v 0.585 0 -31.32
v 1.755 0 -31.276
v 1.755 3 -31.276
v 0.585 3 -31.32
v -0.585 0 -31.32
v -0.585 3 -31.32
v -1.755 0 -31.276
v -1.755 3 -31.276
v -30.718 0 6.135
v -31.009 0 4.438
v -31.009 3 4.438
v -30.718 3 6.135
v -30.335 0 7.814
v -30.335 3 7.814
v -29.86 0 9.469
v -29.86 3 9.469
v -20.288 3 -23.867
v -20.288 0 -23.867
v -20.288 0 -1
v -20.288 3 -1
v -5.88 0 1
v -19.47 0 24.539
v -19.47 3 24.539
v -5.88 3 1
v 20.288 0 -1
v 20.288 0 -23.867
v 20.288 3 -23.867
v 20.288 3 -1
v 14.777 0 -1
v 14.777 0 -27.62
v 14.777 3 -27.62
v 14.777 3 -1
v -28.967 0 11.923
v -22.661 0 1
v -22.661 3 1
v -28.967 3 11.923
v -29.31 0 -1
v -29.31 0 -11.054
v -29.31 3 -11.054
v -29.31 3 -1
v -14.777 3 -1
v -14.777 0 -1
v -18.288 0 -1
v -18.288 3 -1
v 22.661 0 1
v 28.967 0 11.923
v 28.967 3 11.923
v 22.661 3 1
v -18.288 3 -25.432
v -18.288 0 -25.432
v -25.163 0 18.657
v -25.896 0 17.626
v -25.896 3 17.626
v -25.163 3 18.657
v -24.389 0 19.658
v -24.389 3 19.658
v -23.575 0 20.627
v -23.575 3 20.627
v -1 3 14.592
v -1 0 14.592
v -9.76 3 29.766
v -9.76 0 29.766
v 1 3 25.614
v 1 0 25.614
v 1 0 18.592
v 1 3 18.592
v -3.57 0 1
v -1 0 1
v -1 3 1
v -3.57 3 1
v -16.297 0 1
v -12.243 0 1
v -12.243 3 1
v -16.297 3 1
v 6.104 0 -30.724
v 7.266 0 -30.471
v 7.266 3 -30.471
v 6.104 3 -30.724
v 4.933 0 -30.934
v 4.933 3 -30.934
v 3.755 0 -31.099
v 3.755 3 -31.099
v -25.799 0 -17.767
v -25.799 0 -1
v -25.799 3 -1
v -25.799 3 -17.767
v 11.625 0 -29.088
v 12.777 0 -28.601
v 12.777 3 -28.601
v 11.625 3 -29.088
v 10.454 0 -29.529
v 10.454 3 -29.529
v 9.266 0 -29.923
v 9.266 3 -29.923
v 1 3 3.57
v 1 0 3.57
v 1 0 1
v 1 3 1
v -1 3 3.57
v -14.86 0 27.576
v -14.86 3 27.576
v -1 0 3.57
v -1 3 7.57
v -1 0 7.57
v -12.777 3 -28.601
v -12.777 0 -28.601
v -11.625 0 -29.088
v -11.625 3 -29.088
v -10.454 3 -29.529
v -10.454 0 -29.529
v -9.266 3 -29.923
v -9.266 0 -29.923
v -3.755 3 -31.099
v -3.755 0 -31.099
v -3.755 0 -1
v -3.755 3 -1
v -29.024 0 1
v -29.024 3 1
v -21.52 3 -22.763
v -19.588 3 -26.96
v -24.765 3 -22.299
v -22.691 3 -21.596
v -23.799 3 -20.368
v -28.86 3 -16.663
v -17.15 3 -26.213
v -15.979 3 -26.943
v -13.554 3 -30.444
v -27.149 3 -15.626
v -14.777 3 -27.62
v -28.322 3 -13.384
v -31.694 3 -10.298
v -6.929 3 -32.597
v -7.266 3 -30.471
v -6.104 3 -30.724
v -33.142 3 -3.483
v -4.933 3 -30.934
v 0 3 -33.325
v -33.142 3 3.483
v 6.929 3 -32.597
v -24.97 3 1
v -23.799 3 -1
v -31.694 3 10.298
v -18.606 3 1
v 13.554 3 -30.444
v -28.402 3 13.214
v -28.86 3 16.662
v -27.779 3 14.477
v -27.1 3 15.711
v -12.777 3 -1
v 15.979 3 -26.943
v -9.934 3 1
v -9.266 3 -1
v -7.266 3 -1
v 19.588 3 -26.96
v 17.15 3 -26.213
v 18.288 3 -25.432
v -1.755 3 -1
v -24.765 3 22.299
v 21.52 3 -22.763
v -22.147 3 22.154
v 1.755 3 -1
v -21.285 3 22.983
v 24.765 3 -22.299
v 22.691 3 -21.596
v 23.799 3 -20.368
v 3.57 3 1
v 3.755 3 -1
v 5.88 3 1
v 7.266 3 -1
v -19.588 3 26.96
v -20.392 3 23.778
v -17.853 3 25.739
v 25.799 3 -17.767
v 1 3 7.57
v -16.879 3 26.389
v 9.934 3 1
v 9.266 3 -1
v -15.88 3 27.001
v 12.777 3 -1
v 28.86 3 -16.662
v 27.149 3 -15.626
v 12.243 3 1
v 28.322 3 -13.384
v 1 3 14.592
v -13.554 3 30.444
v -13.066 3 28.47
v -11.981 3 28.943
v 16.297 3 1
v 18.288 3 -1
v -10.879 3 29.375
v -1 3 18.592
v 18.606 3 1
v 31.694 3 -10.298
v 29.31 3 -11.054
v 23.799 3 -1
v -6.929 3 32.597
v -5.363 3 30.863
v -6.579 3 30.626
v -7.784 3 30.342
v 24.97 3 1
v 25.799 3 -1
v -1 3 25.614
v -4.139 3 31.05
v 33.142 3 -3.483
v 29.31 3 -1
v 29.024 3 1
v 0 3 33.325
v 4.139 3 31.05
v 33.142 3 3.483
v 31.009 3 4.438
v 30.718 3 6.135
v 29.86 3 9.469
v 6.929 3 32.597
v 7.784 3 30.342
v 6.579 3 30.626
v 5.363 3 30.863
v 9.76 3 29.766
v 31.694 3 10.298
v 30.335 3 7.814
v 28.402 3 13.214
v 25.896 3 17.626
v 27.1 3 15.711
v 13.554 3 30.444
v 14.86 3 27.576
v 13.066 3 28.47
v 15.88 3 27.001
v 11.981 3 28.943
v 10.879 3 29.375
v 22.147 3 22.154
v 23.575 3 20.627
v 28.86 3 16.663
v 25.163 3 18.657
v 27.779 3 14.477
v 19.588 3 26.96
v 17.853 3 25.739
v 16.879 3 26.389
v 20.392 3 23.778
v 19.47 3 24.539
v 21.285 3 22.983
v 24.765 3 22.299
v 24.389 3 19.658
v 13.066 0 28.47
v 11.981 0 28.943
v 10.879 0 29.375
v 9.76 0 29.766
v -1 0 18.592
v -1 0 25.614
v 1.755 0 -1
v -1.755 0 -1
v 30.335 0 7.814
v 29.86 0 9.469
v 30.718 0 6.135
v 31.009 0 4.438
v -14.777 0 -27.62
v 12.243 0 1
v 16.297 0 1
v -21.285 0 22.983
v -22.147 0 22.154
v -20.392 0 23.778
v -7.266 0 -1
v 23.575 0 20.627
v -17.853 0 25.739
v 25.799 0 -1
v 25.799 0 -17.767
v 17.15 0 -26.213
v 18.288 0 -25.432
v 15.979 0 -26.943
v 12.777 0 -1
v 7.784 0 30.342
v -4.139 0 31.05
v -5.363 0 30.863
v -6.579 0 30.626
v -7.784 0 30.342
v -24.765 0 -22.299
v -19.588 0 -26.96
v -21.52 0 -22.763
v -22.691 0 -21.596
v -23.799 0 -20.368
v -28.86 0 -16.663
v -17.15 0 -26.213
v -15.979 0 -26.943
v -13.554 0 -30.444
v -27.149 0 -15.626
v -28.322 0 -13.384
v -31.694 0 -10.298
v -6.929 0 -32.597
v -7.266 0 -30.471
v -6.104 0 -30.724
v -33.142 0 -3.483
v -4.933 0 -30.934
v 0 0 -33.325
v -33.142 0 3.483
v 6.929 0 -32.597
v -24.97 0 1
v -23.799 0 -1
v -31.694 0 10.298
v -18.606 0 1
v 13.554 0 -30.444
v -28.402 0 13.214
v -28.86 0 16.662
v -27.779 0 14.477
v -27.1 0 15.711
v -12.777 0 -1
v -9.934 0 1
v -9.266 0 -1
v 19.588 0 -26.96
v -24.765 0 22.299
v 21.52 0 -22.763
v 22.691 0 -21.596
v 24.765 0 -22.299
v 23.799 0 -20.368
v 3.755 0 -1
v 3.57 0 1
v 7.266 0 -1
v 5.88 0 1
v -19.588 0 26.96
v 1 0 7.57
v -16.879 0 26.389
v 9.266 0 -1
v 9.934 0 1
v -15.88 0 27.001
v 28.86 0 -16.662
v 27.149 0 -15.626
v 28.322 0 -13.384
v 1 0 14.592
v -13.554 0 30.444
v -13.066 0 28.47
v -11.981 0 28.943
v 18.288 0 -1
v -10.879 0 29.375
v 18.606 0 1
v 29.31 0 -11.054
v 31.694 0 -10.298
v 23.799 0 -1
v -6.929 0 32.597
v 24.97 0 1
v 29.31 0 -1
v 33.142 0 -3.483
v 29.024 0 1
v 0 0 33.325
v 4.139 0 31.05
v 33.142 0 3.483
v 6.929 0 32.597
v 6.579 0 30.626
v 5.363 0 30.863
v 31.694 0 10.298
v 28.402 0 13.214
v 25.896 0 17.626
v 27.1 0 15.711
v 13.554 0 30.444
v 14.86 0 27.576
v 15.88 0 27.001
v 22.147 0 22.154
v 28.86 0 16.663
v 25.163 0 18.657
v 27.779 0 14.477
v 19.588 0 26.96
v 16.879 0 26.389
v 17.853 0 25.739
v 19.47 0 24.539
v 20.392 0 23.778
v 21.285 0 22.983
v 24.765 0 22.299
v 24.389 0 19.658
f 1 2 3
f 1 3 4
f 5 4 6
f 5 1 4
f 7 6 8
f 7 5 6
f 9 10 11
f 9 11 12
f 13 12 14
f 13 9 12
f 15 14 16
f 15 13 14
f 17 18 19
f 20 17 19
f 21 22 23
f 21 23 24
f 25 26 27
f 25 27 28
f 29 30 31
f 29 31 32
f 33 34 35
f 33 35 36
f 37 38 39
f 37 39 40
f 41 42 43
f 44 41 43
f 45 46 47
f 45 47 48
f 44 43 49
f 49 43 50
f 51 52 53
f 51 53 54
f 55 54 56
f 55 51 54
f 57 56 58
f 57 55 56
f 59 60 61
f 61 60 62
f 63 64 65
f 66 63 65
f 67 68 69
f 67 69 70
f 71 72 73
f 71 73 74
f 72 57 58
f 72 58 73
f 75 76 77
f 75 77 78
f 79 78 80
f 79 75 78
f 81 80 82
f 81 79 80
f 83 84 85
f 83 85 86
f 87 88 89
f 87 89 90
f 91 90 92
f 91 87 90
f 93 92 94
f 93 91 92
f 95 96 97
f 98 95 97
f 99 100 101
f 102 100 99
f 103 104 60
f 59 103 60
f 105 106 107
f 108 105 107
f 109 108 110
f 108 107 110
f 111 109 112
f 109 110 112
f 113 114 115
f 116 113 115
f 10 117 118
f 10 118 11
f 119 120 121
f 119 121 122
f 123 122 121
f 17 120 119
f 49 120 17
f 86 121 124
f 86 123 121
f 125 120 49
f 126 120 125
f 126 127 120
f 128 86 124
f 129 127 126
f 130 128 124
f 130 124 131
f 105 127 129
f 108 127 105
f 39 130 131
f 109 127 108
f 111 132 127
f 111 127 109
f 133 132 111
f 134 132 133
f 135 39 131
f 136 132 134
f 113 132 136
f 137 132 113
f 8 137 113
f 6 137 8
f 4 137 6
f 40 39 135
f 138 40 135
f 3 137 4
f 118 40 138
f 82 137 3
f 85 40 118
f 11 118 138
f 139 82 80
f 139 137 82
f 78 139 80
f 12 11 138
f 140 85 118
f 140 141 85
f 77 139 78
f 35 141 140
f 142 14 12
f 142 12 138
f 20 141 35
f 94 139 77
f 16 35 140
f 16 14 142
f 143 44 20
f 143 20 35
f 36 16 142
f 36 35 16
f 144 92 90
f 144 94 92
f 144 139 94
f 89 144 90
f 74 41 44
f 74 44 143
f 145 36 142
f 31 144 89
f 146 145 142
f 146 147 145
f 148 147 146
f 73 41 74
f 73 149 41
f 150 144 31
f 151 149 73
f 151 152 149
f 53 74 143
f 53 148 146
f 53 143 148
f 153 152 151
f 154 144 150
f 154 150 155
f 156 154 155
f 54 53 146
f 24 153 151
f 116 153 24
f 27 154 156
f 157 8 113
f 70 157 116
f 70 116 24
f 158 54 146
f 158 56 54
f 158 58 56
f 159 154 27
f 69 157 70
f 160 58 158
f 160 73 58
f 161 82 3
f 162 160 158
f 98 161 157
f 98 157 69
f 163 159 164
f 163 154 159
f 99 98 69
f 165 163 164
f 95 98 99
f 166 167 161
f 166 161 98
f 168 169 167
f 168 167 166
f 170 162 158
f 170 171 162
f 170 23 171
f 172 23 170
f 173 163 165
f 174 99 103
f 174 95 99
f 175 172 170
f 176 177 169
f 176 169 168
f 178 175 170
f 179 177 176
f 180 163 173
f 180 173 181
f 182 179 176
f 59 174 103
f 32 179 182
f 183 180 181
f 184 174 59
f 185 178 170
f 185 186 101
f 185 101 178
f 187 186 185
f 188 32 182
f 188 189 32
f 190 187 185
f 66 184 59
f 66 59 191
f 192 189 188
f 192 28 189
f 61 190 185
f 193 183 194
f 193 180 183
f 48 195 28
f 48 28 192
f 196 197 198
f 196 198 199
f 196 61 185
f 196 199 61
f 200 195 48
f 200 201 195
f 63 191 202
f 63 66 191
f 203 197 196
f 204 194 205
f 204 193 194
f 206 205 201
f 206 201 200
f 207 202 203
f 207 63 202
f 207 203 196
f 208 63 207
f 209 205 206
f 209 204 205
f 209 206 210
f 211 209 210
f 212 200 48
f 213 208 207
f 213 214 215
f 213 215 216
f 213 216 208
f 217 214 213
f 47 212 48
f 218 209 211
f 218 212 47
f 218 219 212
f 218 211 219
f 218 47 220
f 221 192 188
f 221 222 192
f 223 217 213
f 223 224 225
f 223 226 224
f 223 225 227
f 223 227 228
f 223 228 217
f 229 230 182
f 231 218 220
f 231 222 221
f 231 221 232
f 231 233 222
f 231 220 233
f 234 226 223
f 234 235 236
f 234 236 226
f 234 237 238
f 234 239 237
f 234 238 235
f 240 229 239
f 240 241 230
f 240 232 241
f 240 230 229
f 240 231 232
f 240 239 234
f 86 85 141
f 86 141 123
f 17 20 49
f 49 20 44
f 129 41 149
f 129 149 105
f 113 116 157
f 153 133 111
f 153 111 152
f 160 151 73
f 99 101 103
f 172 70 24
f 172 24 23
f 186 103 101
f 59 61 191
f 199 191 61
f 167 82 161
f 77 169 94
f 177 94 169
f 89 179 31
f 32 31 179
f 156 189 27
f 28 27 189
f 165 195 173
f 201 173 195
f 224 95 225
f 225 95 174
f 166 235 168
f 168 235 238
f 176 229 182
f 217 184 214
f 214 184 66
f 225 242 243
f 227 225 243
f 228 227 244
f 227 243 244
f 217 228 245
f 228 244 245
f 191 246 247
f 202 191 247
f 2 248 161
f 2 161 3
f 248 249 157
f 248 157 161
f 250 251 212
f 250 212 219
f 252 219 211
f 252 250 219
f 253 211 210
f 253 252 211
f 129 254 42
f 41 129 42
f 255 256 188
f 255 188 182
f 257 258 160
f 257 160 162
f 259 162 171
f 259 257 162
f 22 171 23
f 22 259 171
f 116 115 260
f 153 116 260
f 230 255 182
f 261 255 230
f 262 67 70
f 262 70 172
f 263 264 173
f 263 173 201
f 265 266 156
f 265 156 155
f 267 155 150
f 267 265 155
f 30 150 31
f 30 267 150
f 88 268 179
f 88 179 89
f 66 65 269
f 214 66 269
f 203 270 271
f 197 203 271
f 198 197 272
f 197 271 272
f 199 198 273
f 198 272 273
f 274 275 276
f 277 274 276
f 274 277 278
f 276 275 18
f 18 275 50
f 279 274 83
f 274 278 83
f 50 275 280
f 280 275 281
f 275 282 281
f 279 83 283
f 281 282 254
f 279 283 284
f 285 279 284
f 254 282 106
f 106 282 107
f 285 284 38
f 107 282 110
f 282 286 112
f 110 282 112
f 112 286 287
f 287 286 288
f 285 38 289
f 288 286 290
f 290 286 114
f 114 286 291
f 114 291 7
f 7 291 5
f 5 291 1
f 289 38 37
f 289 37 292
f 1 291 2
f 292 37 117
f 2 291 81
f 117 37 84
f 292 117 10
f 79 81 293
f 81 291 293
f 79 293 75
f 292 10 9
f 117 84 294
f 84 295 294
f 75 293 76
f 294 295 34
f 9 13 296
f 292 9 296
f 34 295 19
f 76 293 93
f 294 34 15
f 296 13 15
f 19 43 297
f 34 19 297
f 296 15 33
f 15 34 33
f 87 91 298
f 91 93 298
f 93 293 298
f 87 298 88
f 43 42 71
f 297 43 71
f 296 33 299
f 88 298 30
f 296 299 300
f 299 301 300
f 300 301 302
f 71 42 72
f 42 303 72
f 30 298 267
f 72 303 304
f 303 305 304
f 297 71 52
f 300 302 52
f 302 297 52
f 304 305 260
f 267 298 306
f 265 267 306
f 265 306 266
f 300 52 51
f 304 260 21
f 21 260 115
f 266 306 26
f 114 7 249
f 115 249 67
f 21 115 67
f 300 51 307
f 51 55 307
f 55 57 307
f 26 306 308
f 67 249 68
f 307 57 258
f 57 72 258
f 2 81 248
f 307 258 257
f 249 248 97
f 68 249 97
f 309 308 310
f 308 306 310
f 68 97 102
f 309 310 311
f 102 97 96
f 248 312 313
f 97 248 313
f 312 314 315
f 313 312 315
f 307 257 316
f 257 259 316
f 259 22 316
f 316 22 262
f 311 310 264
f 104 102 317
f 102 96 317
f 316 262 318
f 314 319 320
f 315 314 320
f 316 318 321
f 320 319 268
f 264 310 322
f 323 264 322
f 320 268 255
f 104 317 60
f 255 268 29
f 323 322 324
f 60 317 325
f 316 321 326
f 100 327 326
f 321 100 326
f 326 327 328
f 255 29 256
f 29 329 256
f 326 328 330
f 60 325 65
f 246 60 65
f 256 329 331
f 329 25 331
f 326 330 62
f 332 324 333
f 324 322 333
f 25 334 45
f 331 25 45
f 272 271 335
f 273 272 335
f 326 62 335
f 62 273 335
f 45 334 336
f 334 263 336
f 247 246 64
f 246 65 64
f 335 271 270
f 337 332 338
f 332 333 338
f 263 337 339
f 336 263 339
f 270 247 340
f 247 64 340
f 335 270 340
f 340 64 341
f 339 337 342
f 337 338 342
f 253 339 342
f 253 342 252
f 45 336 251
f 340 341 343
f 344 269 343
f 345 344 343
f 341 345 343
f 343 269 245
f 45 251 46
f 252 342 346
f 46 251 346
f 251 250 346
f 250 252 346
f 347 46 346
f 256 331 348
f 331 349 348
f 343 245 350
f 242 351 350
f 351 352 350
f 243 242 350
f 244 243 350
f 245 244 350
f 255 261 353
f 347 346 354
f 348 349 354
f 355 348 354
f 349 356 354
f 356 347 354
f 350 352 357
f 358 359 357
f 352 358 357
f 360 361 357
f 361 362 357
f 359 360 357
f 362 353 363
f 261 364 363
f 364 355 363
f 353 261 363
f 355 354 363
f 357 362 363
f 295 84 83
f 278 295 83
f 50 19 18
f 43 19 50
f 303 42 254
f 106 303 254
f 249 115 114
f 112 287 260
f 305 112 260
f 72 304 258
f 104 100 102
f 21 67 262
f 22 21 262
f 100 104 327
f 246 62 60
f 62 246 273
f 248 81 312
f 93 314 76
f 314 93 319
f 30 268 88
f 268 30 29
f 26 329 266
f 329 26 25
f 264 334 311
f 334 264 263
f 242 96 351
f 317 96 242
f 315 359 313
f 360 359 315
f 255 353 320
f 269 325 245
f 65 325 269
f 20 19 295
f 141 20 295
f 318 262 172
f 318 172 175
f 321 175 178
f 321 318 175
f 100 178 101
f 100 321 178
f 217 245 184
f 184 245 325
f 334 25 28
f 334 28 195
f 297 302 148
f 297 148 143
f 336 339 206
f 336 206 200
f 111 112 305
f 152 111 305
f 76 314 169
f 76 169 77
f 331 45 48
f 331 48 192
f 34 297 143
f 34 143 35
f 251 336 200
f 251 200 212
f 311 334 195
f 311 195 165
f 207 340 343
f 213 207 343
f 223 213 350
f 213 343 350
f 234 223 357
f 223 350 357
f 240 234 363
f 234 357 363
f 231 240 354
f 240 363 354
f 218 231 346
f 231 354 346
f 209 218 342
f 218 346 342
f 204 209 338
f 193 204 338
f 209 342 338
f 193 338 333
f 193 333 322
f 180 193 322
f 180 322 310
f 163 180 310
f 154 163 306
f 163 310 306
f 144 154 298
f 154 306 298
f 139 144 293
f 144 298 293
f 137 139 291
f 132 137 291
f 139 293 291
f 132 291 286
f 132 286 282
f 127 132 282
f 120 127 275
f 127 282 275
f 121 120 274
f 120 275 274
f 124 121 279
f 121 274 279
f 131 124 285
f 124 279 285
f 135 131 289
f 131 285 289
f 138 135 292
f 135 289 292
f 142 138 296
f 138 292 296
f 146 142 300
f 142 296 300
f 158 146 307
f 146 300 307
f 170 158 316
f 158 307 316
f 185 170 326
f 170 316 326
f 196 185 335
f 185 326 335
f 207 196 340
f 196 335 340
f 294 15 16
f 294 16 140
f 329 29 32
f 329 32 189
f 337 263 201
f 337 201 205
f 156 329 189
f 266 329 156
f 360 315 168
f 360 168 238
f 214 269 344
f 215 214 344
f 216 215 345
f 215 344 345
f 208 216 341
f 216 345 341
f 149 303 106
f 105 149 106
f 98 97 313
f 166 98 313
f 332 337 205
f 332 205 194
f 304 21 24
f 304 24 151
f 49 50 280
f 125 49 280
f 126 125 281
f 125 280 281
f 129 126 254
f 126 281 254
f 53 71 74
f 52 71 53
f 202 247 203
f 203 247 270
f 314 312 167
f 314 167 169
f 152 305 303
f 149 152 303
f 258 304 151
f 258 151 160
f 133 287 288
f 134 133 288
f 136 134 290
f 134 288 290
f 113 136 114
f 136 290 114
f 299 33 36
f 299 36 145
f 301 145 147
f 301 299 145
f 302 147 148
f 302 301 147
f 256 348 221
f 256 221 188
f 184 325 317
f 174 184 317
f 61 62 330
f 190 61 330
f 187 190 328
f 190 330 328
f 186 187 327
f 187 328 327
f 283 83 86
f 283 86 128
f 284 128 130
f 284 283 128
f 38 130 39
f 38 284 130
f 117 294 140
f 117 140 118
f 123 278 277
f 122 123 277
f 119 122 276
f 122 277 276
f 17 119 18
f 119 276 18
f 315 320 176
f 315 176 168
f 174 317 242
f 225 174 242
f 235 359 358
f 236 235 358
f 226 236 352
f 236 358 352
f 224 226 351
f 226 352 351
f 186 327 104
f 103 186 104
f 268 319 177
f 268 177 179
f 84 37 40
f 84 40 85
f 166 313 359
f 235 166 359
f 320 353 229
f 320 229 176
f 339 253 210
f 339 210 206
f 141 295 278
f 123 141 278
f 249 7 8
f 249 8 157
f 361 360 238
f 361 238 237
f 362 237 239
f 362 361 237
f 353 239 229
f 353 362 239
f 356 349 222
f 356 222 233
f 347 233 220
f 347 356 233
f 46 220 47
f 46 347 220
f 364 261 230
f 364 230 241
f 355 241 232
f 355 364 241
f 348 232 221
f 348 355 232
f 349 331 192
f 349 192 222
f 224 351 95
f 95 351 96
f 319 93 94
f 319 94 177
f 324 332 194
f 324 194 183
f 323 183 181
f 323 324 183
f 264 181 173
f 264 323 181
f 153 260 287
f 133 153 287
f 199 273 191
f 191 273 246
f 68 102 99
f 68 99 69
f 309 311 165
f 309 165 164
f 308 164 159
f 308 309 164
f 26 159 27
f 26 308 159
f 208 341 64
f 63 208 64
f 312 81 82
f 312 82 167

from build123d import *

# Parameters (mm, degrees)
SKETCH1_R           = 33.325
BOSS_EXTRUDE1_DEPTH = 3


with BuildPart() as part:
    # Sketch1 → Boss-Extrude1 (new body)
    with BuildSketch(Plane(origin=(0, 0, 0), x_dir=(1, 0, 0), z_dir=(0, 1, 0))):
        with Locations(Location((0, 0, 0), (0, 0, 270))):
            Circle(SKETCH1_R)
        with BuildLine():
            Line((1.755453897, 1), (1.755453897, 31.275773477))
            ThreePointArc((1.755453897, 31.275773477), (0, 31.325), (-1.755453897, 31.275773477))
            Line((-1.755453897, 31.275773477), (-1.755453897, 1))
            Line((-1.755453897, 1), (1.755453897, 1))
        make_face(mode=Mode.SUBTRACT)
        with BuildLine():
            Line((29.30999287, 1), (29.30999287, 11.053503651))
            ThreePointArc((29.30999287, 11.053503651), (27.758242919, 14.516734311), (25.799085075, 17.766902776))
            Line((25.799085075, 17.766902776), (25.799085075, 1))
            Line((25.799085075, 1), (29.30999287, 1))
        make_face(mode=Mode.SUBTRACT)
        with BuildLine():
            Line((3.755453897, 1), (7.266361692, 1))
            Line((7.266361692, 1), (7.266361692, 30.470569617))
            ThreePointArc((7.266361692, 30.470569617), (5.519860332, 30.834830418), (3.755453897, 31.099070581))
            Line((3.755453897, 31.099070581), (3.755453897, 1))
        make_face(mode=Mode.SUBTRACT)
        with BuildLine():
            Line((9.266361692, 1), (12.777269486, 1))
            Line((12.777269486, 1), (12.777269486, 28.600647011))
            ThreePointArc((12.777269486, 28.600647011), (11.041631222, 29.314467502), (9.266361692, 29.923070798))
            Line((9.266361692, 29.923070798), (9.266361692, 1))
        make_face(mode=Mode.SUBTRACT)
        with BuildLine():
            Line((14.777269486, 1), (18.288177281, 1))
            Line((18.288177281, 1), (18.288177281, 25.432227522))
            ThreePointArc((18.288177281, 25.432227522), (16.568886372, 26.584349332), (14.777269486, 27.620425984))
            Line((14.777269486, 27.620425984), (14.777269486, 1))
        make_face(mode=Mode.SUBTRACT)
        with BuildLine():
            Line((20.288177281, 1), (23.799085075, 1))
            Line((23.799085075, 1), (23.799085075, 20.36809207))
            ThreePointArc((23.799085075, 20.36809207), (22.112953153, 22.187224429), (20.288177281, 23.867247173))
            Line((20.288177281, 23.867247173), (20.288177281, 1))
        make_face(mode=Mode.SUBTRACT)
        with BuildLine():
            Line((1, -3.570162886), (1, -1))
            Line((1, -1), (3.570162886, -1))
            Line((3.570162886, -1), (17.853404495, -25.739300164))
            ThreePointArc((17.853404495, -25.739300164), (16.382380994, -26.699685728), (14.859831538, -27.576095294))
            Line((14.859831538, -27.576095294), (1, -3.570162886))
        make_face(mode=Mode.SUBTRACT)
        with BuildLine():
            Line((5.879563963, -1), (19.469969491, -24.53927287))
            ThreePointArc((19.469969491, -24.53927287), (20.842468862, -23.384762491), (22.146644648, -22.153594648))
            Line((22.146644648, -22.153594648), (9.933611084, -1))
            Line((9.933611084, -1), (5.879563963, -1))
        make_face(mode=Mode.SUBTRACT)
        with BuildLine():
            Line((12.24301216, -1), (23.574814489, -20.627257375))
            ThreePointArc((23.574814489, -20.627257375), (24.780818594, -19.161593223), (25.895841507, -17.625578506))
            Line((25.895841507, -17.625578506), (16.297059281, -1))
            Line((16.297059281, -1), (12.24301216, -1))
        make_face(mode=Mode.SUBTRACT)
        with BuildLine():
            Line((18.606460358, -1), (27.100022956, -15.711281958))
            ThreePointArc((27.100022956, -15.711281958), (28.097453336, -13.848781211), (28.967067125, -11.923281729))
            Line((28.967067125, -11.923281729), (22.660507478, -1))
            Line((22.660507478, -1), (18.606460358, -1))
        make_face(mode=Mode.SUBTRACT)
        with BuildLine():
            Line((24.969908555, -1), (29.85953815, -9.469086888))
            ThreePointArc((29.85953815, -9.469086888), (30.538044757, -6.977352466), (31.0089993, -4.438196413))
            Line((31.0089993, -4.438196413), (29.023955676, -1))
            Line((29.023955676, -1), (24.969908555, -1))
        make_face(mode=Mode.SUBTRACT)
        with BuildLine():
            Line((1, -7.570162886), (13.066371144, -28.46973077))
            ThreePointArc((13.066371144, -28.46973077), (11.431797975, -29.164526742), (9.760473509, -29.765563692))
            Line((9.760473509, -29.765563692), (1, -14.591978475))
            Line((1, -14.591978475), (1, -7.570162886))
        make_face(mode=Mode.SUBTRACT)
        with BuildLine():
            Line((1, -18.591978475), (7.784125884, -30.342429191))
            ThreePointArc((7.784125884, -30.342429191), (5.971968683, -30.750466908), (4.138812131, -31.050376151))
            Line((4.138812131, -31.050376151), (1, -25.613794064))
            Line((1, -25.613794064), (1, -18.591978475))
        make_face(mode=Mode.SUBTRACT)
        with BuildLine():
            Line((-29.30999287, 1), (-25.799085075, 1))
            Line((-25.799085075, 1), (-25.799085075, 17.766902776))
            ThreePointArc((-25.799085075, 17.766902776), (-27.758242919, 14.516734311), (-29.30999287, 11.053503651))
            Line((-29.30999287, 11.053503651), (-29.30999287, 1))
        make_face(mode=Mode.SUBTRACT)
        with BuildLine():
            Line((-20.288177281, 1), (-23.799085075, 1))
            Line((-23.799085075, 1), (-23.799085075, 20.36809207))
            ThreePointArc((-23.799085075, 20.36809207), (-22.112953153, 22.187224429), (-20.288177281, 23.867247173))
            Line((-20.288177281, 23.867247173), (-20.288177281, 1))
        make_face(mode=Mode.SUBTRACT)
        with BuildLine():
            Line((-14.777269486, 1), (-18.288177281, 1))
            Line((-18.288177281, 1), (-18.288177281, 25.432227522))
            ThreePointArc((-18.288177281, 25.432227522), (-16.568886372, 26.584349332), (-14.777269486, 27.620425984))
            Line((-14.777269486, 27.620425984), (-14.777269486, 1))
        make_face(mode=Mode.SUBTRACT)
        with BuildLine():
            Line((-9.266361692, 1), (-12.777269486, 1))
            Line((-12.777269486, 1), (-12.777269486, 28.600647011))
            ThreePointArc((-12.777269486, 28.600647011), (-11.041631222, 29.314467502), (-9.266361692, 29.923070798))
            Line((-9.266361692, 29.923070798), (-9.266361692, 1))
        make_face(mode=Mode.SUBTRACT)
        with BuildLine():
            Line((-3.755453897, 1), (-7.266361692, 1))
            Line((-7.266361692, 1), (-7.266361692, 30.470569617))
            ThreePointArc((-7.266361692, 30.470569617), (-5.519860332, 30.834830418), (-3.755453897, 31.099070581))
            Line((-3.755453897, 31.099070581), (-3.755453897, 1))
        make_face(mode=Mode.SUBTRACT)
        with BuildLine():
            Line((-24.969908555, -1), (-29.023955676, -1))
            Line((-29.023955676, -1), (-31.0089993, -4.438196413))
            ThreePointArc((-31.0089993, -4.438196413), (-30.538044757, -6.977352466), (-29.85953815, -9.469086888))
            Line((-29.85953815, -9.469086888), (-24.969908555, -1))
        make_face(mode=Mode.SUBTRACT)
        with BuildLine():
            Line((-18.606460358, -1), (-22.660507478, -1))
            Line((-22.660507478, -1), (-28.967067125, -11.923281729))
            ThreePointArc((-28.967067125, -11.923281729), (-28.097453336, -13.848781211), (-27.100022956, -15.711281958))
            Line((-27.100022956, -15.711281958), (-18.606460358, -1))
        make_face(mode=Mode.SUBTRACT)
        with BuildLine():
            Line((-12.24301216, -1), (-16.297059281, -1))
            Line((-16.297059281, -1), (-25.895841507, -17.625578506))
            ThreePointArc((-25.895841507, -17.625578506), (-24.780818594, -19.161593223), (-23.574814489, -20.627257375))
            Line((-23.574814489, -20.627257375), (-12.24301216, -1))
        make_face(mode=Mode.SUBTRACT)
        with BuildLine():
            Line((-5.879563963, -1), (-9.933611084, -1))
            Line((-9.933611084, -1), (-22.146644648, -22.153594648))
            ThreePointArc((-22.146644648, -22.153594648), (-20.842468862, -23.384762491), (-19.469969491, -24.53927287))
            Line((-19.469969491, -24.53927287), (-5.879563963, -1))
        make_face(mode=Mode.SUBTRACT)
        with BuildLine():
            Line((-1, -1), (-3.570162886, -1))
            Line((-3.570162886, -1), (-17.853404495, -25.739300164))
            ThreePointArc((-17.853404495, -25.739300164), (-16.382380994, -26.699685728), (-14.859831538, -27.576095294))
            Line((-14.859831538, -27.576095294), (-1, -3.570162886))
            Line((-1, -3.570162886), (-1, -1))
        make_face(mode=Mode.SUBTRACT)
        with BuildLine():
            Line((-1, -7.570162886), (-1, -14.591978475))
            Line((-1, -14.591978475), (-9.760473509, -29.765563692))
            ThreePointArc((-9.760473509, -29.765563692), (-11.431797975, -29.164526742), (-13.066371144, -28.46973077))
            Line((-13.066371144, -28.46973077), (-1, -7.570162886))
        make_face(mode=Mode.SUBTRACT)
        with BuildLine():
            Line((-1, -18.591978475), (-1, -25.613794064))
            Line((-1, -25.613794064), (-4.138812131, -31.050376151))
            ThreePointArc((-4.138812131, -31.050376151), (-5.971968683, -30.750466908), (-7.784125884, -30.342429191))
            Line((-7.784125884, -30.342429191), (-1, -18.591978475))
        make_face(mode=Mode.SUBTRACT)
    extrude(amount=BOSS_EXTRUDE1_DEPTH)


solid = part.part
